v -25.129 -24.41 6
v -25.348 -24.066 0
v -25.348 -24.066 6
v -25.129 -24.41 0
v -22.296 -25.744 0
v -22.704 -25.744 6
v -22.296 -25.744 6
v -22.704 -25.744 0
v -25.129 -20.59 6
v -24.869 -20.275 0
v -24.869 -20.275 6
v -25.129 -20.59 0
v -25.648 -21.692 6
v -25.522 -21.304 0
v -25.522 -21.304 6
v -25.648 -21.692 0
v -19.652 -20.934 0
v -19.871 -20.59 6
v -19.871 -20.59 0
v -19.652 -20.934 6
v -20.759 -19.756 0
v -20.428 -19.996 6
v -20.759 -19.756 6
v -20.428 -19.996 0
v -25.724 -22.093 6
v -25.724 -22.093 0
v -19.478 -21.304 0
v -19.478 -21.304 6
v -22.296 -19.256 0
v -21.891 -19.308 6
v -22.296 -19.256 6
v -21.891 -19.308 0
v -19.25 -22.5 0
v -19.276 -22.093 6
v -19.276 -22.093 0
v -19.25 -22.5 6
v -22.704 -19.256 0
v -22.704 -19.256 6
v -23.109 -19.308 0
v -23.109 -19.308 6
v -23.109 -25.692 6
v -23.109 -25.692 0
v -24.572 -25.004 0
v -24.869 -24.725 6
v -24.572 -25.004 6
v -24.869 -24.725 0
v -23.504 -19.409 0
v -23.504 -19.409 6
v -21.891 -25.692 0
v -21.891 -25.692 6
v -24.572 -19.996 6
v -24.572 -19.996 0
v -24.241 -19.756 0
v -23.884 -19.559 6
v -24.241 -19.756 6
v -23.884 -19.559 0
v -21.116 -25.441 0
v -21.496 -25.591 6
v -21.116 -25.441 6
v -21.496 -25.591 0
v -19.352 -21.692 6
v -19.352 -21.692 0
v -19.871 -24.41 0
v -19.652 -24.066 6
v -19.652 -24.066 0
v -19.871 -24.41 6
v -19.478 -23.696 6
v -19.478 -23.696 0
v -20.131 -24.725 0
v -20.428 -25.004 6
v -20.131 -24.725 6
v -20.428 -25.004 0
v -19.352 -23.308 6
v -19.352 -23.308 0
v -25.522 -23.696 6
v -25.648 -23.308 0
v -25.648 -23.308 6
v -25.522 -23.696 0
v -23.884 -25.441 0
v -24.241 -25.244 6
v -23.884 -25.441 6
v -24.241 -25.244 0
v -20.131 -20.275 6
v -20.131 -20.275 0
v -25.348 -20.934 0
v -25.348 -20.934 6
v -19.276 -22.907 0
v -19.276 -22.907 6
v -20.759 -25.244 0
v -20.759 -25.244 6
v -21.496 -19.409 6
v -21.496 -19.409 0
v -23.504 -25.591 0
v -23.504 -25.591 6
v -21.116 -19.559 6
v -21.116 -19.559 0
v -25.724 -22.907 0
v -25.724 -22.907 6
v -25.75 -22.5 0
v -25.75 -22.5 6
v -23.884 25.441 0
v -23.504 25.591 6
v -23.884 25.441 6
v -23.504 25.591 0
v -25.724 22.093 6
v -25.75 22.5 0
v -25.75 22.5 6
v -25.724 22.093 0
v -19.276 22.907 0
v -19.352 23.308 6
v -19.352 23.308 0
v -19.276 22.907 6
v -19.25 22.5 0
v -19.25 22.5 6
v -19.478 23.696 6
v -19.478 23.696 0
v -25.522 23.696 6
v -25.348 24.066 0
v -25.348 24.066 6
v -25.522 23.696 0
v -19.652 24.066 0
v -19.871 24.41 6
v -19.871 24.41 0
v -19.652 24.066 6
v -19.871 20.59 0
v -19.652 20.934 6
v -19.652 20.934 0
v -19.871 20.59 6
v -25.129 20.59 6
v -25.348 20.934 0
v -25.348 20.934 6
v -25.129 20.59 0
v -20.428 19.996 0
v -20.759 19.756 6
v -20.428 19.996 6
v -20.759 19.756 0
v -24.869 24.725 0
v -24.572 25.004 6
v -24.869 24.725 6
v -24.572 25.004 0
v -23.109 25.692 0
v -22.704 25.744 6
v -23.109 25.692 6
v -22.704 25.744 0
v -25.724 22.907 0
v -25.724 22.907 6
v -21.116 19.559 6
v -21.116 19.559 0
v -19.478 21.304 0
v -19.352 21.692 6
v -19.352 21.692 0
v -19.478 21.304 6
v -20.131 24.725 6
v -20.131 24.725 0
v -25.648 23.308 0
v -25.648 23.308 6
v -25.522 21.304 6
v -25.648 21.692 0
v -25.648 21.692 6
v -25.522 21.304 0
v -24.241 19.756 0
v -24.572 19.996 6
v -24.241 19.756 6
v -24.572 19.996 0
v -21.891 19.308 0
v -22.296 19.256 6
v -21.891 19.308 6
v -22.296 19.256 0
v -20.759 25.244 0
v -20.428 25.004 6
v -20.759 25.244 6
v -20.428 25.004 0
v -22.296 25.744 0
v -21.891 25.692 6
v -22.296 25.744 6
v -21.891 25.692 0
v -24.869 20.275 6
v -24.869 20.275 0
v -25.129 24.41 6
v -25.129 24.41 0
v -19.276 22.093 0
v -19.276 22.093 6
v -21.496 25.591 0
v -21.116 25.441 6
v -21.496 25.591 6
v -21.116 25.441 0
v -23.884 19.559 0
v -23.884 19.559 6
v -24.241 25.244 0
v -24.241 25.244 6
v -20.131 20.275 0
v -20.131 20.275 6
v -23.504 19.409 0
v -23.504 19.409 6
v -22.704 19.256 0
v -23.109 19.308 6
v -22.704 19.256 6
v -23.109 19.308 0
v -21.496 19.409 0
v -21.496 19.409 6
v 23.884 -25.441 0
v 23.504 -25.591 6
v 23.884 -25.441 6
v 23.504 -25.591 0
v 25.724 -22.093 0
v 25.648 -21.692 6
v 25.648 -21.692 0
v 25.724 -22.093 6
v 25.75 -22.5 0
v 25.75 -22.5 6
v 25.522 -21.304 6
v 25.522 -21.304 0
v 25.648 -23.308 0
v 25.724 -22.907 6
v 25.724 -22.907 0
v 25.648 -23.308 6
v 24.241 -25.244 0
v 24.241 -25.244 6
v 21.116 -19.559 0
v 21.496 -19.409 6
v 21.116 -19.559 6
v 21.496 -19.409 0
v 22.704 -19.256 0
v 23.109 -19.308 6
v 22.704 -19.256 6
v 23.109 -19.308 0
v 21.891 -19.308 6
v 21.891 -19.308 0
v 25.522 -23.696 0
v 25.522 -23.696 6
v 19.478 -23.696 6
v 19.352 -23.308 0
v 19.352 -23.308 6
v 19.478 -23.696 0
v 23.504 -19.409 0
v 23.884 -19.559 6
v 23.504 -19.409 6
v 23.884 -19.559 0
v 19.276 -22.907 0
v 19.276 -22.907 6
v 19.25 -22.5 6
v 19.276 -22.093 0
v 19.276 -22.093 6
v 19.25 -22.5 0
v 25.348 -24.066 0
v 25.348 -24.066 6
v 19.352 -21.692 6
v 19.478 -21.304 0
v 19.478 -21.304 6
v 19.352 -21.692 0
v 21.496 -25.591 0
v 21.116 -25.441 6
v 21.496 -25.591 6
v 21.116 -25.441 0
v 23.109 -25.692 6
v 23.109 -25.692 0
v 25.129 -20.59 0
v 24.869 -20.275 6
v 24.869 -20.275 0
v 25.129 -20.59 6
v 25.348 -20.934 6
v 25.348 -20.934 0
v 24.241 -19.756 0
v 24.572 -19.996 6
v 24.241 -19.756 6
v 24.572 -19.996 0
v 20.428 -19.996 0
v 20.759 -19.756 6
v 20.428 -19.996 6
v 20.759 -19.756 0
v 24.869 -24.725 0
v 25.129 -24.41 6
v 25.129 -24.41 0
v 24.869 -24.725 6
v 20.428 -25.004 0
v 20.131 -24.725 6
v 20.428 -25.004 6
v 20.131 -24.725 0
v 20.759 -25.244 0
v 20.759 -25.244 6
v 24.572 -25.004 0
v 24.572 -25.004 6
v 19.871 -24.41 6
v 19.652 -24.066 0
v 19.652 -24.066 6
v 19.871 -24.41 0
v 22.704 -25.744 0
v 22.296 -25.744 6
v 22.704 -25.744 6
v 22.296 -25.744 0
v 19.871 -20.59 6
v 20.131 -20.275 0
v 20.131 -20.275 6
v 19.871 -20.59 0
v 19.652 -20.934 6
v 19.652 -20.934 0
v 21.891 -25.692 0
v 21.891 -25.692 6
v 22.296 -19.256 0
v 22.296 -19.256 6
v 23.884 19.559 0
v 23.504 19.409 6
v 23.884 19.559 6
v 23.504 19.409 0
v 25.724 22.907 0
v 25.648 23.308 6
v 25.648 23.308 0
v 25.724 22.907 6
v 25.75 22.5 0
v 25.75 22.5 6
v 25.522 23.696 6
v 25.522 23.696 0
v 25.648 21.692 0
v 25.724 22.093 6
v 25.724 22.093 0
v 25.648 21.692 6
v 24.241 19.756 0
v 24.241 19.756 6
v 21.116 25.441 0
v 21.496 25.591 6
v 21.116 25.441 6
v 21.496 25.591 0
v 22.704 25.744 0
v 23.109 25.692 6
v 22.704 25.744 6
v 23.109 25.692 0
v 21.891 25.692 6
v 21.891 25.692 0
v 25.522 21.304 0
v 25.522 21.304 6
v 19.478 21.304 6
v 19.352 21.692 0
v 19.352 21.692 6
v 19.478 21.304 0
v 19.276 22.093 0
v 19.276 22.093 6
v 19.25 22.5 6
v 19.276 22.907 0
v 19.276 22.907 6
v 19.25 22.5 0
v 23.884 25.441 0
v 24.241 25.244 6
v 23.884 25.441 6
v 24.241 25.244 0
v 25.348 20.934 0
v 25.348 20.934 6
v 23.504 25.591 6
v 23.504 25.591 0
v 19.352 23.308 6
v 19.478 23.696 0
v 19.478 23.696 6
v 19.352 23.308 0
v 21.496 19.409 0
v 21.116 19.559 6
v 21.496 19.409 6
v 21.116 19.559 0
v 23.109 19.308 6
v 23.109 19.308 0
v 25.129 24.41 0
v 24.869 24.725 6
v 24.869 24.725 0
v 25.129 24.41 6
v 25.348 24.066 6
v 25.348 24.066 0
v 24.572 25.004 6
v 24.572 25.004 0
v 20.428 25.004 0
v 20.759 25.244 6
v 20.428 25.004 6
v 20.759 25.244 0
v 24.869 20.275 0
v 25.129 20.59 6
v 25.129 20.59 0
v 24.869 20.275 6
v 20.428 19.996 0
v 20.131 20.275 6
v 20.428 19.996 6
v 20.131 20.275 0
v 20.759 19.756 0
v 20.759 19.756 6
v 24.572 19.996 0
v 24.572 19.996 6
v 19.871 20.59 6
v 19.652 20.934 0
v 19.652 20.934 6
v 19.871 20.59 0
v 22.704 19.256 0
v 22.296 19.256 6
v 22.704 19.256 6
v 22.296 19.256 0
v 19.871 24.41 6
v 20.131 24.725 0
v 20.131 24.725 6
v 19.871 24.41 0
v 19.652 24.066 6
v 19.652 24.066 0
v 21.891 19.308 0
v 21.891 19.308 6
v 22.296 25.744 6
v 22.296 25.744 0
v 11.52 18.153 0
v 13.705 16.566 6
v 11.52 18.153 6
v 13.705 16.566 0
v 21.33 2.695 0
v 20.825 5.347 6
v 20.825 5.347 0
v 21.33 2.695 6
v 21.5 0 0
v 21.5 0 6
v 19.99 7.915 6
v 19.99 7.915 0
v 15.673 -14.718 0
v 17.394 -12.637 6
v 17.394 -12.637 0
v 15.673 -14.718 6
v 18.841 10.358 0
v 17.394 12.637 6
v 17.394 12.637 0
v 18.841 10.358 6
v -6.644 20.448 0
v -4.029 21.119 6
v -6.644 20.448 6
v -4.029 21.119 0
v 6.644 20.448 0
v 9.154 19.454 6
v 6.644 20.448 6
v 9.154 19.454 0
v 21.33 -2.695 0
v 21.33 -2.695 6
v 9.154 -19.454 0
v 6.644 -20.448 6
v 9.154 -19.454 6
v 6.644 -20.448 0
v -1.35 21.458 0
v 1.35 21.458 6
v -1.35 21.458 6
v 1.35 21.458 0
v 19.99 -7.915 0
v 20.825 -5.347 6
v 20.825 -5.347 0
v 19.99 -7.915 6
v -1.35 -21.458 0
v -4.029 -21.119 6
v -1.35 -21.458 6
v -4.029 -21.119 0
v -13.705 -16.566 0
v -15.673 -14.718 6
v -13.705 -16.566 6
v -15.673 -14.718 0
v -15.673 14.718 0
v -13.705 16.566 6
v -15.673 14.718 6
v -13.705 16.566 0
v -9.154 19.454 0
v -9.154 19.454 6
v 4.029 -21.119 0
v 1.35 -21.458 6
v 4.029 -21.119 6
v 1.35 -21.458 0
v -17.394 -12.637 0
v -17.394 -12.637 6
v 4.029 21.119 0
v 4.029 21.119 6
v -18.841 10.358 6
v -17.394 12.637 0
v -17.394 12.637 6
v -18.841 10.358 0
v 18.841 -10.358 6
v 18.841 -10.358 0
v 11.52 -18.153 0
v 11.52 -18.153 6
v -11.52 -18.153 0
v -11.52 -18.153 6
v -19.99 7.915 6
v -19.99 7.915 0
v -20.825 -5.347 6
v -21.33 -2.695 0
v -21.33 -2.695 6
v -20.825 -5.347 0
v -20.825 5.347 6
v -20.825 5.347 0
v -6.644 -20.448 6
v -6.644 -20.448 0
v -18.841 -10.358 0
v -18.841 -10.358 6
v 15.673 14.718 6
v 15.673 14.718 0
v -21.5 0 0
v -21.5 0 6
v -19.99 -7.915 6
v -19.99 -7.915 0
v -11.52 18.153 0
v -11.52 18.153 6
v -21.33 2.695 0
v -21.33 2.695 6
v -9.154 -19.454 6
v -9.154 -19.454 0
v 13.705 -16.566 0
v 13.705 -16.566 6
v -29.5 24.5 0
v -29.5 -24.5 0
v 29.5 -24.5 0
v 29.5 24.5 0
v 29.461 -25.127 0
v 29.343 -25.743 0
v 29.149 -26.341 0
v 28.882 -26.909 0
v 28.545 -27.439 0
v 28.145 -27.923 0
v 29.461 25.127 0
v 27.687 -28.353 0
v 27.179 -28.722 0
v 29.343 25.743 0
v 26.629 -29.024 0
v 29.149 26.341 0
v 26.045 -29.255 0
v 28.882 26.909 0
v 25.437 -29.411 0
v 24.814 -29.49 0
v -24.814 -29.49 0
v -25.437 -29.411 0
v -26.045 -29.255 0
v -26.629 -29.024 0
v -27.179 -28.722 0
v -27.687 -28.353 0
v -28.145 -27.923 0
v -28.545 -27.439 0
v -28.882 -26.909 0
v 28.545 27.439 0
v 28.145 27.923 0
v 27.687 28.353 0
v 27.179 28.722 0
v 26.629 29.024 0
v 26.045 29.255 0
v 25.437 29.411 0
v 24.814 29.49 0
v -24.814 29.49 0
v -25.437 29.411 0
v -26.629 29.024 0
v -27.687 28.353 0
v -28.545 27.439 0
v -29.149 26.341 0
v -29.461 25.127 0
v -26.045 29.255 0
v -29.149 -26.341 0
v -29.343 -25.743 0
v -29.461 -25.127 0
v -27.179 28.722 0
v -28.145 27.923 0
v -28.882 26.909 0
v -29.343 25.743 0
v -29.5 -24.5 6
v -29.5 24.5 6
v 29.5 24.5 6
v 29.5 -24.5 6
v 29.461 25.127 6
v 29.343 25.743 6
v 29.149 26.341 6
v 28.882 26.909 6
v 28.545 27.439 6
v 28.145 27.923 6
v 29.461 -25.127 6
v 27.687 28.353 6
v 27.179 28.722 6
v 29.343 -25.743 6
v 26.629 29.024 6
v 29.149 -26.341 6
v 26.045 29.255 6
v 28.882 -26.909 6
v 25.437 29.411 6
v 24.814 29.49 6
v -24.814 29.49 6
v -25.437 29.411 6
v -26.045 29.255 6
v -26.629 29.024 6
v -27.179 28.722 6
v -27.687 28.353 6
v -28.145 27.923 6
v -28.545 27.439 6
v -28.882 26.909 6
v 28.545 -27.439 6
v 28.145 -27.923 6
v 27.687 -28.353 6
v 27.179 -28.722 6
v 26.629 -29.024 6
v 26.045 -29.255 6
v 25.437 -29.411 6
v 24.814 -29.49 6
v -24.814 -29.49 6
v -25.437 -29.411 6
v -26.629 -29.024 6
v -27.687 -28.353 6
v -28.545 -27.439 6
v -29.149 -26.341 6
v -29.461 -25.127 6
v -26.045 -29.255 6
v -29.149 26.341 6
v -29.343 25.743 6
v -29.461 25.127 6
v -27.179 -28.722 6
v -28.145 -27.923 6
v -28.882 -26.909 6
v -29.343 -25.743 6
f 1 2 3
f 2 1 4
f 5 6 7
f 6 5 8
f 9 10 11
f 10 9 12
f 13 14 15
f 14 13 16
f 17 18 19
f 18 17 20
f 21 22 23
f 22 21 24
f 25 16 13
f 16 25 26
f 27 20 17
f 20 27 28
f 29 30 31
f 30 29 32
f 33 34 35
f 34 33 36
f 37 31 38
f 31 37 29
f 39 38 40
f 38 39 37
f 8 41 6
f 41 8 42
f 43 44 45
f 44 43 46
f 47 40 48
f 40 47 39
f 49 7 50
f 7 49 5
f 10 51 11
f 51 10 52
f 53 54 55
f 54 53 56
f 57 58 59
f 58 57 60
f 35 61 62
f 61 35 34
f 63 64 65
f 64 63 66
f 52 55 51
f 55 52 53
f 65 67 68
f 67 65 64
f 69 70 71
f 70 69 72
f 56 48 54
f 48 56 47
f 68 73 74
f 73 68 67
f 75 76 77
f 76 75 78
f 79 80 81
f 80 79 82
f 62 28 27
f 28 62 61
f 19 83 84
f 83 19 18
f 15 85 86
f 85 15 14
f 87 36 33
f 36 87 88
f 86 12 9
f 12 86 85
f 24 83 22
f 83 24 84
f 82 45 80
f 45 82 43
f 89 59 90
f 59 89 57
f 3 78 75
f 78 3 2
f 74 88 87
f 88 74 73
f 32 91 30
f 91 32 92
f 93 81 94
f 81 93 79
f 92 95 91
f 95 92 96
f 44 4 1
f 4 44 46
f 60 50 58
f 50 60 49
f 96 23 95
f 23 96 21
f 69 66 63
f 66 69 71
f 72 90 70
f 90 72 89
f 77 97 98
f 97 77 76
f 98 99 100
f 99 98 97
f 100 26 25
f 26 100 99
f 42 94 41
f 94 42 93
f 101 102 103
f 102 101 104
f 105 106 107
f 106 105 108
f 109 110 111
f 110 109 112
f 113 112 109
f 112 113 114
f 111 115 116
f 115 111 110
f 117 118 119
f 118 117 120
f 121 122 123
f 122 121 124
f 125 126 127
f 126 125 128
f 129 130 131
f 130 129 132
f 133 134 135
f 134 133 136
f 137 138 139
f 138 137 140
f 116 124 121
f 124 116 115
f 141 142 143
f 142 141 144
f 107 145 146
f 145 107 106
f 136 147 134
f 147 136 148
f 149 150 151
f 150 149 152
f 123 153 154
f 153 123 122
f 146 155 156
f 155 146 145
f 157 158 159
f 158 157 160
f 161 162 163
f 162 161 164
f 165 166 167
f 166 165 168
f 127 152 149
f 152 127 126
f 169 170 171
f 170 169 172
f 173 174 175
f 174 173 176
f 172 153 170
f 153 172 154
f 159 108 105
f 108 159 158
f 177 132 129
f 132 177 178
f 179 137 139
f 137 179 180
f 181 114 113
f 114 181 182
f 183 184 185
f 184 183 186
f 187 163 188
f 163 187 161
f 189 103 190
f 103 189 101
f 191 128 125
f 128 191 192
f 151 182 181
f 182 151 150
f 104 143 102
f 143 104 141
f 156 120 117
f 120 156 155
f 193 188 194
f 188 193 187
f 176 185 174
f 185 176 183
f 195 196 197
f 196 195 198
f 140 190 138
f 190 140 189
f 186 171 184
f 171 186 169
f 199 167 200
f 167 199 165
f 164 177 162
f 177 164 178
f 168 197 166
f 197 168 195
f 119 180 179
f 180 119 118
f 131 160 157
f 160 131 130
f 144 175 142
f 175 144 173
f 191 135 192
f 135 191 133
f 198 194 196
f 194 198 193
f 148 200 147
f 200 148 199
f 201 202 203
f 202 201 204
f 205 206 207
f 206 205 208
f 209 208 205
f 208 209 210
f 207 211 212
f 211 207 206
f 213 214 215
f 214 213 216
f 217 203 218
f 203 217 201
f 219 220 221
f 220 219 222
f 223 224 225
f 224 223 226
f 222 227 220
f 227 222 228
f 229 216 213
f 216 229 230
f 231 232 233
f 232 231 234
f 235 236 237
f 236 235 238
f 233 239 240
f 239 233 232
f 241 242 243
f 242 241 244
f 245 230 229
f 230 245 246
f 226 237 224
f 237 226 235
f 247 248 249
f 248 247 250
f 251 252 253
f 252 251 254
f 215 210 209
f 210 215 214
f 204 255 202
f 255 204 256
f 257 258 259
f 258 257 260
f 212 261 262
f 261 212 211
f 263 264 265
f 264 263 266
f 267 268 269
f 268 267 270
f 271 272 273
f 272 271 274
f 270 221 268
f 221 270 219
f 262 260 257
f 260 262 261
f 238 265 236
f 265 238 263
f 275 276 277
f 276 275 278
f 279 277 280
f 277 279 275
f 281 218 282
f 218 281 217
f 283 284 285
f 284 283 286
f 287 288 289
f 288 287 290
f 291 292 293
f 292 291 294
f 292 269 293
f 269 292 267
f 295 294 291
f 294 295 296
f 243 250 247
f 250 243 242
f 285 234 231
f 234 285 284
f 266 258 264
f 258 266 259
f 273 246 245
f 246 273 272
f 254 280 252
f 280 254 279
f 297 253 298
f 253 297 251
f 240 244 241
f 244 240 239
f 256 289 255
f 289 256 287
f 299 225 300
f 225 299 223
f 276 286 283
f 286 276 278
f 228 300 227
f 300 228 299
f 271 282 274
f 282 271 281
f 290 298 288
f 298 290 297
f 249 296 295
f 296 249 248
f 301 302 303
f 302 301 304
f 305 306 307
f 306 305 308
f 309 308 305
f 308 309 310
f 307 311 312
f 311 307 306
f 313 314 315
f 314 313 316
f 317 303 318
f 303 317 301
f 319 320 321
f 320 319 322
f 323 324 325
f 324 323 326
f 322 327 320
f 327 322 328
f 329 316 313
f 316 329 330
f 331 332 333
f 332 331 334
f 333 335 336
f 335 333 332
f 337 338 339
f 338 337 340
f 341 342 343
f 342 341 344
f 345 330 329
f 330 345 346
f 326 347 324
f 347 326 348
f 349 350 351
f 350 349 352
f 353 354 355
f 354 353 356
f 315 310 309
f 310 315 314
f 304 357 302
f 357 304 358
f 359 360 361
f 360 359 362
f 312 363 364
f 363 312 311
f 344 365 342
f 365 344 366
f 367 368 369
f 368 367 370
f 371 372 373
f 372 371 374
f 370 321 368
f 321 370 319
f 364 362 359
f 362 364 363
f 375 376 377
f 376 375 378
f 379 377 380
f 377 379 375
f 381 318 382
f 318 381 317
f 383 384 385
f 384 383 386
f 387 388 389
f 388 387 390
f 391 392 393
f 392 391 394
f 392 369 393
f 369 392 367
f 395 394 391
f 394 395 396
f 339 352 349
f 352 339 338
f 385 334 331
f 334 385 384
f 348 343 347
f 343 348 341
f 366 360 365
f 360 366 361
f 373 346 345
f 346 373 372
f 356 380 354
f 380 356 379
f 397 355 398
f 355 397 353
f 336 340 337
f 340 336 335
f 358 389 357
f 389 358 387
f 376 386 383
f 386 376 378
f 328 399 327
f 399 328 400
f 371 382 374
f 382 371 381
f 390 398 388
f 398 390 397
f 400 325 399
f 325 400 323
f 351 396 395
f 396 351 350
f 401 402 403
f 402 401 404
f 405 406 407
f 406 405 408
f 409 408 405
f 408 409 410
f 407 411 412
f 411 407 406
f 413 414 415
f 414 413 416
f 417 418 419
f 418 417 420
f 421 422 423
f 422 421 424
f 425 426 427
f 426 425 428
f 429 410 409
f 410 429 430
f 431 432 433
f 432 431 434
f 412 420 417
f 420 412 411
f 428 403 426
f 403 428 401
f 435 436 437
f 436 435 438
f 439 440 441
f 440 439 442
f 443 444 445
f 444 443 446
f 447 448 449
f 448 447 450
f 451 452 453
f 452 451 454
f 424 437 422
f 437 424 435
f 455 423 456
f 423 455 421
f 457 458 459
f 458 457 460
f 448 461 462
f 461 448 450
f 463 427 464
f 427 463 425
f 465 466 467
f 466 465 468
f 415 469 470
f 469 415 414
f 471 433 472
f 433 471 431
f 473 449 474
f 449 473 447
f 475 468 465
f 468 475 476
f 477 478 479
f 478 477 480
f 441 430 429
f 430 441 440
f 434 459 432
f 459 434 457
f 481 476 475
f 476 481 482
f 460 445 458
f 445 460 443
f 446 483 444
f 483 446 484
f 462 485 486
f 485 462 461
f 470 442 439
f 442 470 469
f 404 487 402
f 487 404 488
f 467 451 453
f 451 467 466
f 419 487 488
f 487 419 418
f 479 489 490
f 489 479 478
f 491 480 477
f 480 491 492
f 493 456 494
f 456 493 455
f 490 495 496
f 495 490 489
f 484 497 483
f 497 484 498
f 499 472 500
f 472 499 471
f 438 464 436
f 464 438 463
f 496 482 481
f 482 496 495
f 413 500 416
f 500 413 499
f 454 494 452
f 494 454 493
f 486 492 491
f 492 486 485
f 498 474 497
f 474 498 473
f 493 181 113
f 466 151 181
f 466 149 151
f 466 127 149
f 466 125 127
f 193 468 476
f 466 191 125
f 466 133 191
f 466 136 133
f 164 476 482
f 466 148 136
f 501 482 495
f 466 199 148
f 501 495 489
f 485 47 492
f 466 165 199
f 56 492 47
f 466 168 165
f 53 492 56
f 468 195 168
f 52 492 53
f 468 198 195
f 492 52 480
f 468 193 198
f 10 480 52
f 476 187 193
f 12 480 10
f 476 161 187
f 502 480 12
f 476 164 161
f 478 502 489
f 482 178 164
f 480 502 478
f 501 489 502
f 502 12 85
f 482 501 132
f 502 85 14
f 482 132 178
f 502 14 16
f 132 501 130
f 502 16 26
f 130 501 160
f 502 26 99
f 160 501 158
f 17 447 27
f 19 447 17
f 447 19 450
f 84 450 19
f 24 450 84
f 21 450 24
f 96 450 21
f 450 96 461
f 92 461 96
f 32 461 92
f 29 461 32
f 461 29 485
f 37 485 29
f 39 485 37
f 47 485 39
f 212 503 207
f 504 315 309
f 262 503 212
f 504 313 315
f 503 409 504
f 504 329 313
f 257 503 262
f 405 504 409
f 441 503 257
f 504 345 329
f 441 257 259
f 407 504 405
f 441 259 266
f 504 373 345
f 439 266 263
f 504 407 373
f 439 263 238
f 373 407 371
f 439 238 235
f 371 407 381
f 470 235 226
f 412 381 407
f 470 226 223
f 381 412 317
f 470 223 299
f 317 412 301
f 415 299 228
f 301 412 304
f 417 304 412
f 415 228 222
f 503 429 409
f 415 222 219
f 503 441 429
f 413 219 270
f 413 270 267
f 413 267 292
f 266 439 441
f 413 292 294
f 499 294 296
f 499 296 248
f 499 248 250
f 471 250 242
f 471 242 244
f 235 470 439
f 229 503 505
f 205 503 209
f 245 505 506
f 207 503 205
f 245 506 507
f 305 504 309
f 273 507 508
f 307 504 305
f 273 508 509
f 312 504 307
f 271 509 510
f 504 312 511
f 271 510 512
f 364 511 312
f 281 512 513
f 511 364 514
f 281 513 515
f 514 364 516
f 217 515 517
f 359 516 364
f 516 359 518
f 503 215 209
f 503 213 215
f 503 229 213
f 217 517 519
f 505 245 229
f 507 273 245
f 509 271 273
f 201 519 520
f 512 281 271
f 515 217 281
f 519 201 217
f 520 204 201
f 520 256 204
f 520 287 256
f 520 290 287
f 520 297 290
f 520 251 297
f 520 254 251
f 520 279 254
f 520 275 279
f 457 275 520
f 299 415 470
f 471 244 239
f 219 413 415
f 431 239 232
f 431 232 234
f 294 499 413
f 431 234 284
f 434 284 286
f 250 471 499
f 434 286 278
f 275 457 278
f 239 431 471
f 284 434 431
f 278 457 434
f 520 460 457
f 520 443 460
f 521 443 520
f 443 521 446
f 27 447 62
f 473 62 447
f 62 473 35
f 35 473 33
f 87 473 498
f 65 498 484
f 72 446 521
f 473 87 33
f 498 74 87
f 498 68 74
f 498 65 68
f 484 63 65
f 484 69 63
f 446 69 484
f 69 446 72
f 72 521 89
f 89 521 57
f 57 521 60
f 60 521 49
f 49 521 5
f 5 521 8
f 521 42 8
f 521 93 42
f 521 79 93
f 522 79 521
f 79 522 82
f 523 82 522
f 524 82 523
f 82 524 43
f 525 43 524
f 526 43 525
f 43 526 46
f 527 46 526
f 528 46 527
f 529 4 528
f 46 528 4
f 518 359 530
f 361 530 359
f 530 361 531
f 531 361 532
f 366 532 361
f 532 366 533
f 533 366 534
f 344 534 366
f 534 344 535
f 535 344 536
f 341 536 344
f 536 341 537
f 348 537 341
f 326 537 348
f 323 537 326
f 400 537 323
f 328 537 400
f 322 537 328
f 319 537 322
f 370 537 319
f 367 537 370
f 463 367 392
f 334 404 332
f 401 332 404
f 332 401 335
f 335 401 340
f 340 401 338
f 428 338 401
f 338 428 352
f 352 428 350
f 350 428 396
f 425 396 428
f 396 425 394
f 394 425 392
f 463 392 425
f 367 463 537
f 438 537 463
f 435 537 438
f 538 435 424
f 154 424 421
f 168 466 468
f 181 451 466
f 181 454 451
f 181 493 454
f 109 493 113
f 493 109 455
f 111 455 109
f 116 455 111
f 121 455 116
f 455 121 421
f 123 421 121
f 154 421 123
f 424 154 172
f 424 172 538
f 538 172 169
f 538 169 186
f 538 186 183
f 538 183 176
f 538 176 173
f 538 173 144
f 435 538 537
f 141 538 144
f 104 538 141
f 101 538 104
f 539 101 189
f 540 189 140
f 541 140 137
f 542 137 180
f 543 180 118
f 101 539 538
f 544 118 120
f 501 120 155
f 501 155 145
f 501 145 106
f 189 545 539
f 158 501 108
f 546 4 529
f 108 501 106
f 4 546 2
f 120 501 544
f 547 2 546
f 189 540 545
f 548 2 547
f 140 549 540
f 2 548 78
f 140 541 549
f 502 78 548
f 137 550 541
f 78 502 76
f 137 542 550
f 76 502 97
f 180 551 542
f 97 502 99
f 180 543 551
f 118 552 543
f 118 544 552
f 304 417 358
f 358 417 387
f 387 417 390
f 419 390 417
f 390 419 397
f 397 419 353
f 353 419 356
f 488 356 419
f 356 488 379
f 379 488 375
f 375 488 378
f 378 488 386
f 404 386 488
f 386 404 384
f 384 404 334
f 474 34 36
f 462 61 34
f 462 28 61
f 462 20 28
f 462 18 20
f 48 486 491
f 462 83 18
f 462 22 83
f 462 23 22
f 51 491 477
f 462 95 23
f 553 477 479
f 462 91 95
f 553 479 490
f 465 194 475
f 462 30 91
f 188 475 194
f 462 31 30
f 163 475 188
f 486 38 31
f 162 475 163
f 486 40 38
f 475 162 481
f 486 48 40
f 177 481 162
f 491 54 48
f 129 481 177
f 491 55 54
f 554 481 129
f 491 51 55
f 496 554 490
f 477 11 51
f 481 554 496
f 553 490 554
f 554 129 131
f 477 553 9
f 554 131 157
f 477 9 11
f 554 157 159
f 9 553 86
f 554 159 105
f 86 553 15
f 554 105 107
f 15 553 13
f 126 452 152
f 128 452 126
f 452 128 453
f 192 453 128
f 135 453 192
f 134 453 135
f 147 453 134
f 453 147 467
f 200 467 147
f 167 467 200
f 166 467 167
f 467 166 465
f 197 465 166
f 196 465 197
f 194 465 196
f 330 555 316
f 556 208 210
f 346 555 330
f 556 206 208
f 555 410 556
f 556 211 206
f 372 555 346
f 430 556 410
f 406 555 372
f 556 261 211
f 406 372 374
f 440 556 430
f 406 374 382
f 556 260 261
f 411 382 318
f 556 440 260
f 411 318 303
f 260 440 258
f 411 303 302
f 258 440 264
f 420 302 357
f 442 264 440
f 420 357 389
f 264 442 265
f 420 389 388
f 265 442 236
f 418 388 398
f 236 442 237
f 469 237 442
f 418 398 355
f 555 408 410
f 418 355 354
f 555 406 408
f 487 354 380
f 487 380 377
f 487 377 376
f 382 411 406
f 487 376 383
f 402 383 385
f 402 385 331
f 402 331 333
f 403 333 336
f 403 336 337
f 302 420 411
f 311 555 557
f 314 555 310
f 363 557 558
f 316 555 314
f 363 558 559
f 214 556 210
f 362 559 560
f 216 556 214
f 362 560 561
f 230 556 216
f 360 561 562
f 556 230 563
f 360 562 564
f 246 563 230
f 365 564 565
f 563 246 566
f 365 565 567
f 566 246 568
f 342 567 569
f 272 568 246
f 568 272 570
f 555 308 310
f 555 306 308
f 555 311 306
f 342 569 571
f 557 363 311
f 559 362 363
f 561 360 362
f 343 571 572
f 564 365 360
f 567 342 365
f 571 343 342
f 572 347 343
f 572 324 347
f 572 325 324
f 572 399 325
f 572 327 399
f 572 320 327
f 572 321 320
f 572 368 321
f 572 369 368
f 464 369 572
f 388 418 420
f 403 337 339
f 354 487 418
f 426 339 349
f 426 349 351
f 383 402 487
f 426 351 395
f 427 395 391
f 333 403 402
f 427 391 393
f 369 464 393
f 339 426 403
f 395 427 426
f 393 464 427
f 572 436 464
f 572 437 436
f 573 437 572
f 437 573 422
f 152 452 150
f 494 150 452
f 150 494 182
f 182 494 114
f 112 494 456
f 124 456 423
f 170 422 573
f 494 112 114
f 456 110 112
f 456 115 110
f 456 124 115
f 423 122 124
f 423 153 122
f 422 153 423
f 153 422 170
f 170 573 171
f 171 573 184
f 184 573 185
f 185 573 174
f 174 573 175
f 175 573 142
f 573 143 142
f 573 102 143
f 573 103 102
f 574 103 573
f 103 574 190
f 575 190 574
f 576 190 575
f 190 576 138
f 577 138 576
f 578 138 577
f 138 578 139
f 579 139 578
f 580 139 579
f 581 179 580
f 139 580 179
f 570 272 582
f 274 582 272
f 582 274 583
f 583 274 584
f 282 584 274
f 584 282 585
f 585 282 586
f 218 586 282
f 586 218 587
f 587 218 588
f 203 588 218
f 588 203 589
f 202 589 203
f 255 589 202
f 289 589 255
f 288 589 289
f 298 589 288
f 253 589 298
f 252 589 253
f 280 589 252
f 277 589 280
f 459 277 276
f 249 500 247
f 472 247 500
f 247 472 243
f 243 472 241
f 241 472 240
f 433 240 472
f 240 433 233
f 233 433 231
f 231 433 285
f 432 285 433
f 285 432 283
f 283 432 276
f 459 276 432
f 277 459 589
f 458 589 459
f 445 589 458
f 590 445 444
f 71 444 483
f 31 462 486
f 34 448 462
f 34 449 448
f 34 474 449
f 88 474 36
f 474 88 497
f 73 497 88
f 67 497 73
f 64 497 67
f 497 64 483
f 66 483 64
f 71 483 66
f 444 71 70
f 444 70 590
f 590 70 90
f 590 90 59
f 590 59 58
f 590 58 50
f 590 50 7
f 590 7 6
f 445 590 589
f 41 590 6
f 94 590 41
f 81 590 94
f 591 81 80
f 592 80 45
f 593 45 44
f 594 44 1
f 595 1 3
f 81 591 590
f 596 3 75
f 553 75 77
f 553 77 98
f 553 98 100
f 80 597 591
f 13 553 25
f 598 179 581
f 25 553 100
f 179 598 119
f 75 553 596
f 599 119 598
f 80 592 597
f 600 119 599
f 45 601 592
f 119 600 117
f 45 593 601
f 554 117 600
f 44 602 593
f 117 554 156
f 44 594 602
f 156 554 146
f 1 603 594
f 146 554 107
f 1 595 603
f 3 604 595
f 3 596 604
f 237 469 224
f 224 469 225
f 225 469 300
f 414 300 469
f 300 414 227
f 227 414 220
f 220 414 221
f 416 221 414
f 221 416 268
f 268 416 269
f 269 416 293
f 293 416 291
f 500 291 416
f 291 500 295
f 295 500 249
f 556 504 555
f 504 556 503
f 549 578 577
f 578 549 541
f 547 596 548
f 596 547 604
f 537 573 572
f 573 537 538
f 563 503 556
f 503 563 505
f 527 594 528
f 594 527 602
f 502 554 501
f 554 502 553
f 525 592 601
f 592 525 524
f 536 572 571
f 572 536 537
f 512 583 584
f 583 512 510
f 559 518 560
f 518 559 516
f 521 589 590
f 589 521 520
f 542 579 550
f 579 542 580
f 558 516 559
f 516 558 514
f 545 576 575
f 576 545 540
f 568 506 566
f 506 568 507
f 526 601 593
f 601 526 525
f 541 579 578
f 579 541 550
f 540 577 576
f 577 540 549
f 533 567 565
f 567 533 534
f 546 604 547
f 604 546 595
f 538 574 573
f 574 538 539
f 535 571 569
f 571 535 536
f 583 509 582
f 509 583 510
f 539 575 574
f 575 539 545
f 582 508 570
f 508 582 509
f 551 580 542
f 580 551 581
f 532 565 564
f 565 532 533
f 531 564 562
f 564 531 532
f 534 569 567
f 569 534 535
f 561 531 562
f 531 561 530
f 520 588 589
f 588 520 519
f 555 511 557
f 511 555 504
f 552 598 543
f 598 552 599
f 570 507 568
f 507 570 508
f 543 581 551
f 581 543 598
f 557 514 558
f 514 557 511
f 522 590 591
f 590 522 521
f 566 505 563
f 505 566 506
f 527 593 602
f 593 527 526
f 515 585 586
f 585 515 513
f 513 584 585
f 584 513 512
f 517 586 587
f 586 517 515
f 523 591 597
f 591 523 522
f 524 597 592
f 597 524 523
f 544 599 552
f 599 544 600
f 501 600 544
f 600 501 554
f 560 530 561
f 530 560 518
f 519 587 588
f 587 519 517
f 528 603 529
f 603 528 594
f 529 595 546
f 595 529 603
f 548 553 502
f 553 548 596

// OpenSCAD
$fn = 50;


difference() {
	union() {
		hull() {
			translate(v = [-24.5000000000, 24.5000000000, 0]) {
				cylinder(h = 6, r = 5);
			}
			translate(v = [24.5000000000, 24.5000000000, 0]) {
				cylinder(h = 6, r = 5);
			}
			translate(v = [-24.5000000000, -24.5000000000, 0]) {
				cylinder(h = 6, r = 5);
			}
			translate(v = [24.5000000000, -24.5000000000, 0]) {
				cylinder(h = 6, r = 5);
			}
		}
	}
	union() {
		#translate(v = [-22.5000000000, -22.5000000000, -100.0000000000]) {
			cylinder(h = 200, r = 3.2500000000);
		}
		#translate(v = [-22.5000000000, 22.5000000000, -100.0000000000]) {
			cylinder(h = 200, r = 3.2500000000);
		}
		#translate(v = [22.5000000000, -22.5000000000, -100.0000000000]) {
			cylinder(h = 200, r = 3.2500000000);
		}
		#translate(v = [22.5000000000, 22.5000000000, -100.0000000000]) {
			cylinder(h = 200, r = 3.2500000000);
		}
		#cylinder(h = 6, r = 21.5000000000);
	}
}
